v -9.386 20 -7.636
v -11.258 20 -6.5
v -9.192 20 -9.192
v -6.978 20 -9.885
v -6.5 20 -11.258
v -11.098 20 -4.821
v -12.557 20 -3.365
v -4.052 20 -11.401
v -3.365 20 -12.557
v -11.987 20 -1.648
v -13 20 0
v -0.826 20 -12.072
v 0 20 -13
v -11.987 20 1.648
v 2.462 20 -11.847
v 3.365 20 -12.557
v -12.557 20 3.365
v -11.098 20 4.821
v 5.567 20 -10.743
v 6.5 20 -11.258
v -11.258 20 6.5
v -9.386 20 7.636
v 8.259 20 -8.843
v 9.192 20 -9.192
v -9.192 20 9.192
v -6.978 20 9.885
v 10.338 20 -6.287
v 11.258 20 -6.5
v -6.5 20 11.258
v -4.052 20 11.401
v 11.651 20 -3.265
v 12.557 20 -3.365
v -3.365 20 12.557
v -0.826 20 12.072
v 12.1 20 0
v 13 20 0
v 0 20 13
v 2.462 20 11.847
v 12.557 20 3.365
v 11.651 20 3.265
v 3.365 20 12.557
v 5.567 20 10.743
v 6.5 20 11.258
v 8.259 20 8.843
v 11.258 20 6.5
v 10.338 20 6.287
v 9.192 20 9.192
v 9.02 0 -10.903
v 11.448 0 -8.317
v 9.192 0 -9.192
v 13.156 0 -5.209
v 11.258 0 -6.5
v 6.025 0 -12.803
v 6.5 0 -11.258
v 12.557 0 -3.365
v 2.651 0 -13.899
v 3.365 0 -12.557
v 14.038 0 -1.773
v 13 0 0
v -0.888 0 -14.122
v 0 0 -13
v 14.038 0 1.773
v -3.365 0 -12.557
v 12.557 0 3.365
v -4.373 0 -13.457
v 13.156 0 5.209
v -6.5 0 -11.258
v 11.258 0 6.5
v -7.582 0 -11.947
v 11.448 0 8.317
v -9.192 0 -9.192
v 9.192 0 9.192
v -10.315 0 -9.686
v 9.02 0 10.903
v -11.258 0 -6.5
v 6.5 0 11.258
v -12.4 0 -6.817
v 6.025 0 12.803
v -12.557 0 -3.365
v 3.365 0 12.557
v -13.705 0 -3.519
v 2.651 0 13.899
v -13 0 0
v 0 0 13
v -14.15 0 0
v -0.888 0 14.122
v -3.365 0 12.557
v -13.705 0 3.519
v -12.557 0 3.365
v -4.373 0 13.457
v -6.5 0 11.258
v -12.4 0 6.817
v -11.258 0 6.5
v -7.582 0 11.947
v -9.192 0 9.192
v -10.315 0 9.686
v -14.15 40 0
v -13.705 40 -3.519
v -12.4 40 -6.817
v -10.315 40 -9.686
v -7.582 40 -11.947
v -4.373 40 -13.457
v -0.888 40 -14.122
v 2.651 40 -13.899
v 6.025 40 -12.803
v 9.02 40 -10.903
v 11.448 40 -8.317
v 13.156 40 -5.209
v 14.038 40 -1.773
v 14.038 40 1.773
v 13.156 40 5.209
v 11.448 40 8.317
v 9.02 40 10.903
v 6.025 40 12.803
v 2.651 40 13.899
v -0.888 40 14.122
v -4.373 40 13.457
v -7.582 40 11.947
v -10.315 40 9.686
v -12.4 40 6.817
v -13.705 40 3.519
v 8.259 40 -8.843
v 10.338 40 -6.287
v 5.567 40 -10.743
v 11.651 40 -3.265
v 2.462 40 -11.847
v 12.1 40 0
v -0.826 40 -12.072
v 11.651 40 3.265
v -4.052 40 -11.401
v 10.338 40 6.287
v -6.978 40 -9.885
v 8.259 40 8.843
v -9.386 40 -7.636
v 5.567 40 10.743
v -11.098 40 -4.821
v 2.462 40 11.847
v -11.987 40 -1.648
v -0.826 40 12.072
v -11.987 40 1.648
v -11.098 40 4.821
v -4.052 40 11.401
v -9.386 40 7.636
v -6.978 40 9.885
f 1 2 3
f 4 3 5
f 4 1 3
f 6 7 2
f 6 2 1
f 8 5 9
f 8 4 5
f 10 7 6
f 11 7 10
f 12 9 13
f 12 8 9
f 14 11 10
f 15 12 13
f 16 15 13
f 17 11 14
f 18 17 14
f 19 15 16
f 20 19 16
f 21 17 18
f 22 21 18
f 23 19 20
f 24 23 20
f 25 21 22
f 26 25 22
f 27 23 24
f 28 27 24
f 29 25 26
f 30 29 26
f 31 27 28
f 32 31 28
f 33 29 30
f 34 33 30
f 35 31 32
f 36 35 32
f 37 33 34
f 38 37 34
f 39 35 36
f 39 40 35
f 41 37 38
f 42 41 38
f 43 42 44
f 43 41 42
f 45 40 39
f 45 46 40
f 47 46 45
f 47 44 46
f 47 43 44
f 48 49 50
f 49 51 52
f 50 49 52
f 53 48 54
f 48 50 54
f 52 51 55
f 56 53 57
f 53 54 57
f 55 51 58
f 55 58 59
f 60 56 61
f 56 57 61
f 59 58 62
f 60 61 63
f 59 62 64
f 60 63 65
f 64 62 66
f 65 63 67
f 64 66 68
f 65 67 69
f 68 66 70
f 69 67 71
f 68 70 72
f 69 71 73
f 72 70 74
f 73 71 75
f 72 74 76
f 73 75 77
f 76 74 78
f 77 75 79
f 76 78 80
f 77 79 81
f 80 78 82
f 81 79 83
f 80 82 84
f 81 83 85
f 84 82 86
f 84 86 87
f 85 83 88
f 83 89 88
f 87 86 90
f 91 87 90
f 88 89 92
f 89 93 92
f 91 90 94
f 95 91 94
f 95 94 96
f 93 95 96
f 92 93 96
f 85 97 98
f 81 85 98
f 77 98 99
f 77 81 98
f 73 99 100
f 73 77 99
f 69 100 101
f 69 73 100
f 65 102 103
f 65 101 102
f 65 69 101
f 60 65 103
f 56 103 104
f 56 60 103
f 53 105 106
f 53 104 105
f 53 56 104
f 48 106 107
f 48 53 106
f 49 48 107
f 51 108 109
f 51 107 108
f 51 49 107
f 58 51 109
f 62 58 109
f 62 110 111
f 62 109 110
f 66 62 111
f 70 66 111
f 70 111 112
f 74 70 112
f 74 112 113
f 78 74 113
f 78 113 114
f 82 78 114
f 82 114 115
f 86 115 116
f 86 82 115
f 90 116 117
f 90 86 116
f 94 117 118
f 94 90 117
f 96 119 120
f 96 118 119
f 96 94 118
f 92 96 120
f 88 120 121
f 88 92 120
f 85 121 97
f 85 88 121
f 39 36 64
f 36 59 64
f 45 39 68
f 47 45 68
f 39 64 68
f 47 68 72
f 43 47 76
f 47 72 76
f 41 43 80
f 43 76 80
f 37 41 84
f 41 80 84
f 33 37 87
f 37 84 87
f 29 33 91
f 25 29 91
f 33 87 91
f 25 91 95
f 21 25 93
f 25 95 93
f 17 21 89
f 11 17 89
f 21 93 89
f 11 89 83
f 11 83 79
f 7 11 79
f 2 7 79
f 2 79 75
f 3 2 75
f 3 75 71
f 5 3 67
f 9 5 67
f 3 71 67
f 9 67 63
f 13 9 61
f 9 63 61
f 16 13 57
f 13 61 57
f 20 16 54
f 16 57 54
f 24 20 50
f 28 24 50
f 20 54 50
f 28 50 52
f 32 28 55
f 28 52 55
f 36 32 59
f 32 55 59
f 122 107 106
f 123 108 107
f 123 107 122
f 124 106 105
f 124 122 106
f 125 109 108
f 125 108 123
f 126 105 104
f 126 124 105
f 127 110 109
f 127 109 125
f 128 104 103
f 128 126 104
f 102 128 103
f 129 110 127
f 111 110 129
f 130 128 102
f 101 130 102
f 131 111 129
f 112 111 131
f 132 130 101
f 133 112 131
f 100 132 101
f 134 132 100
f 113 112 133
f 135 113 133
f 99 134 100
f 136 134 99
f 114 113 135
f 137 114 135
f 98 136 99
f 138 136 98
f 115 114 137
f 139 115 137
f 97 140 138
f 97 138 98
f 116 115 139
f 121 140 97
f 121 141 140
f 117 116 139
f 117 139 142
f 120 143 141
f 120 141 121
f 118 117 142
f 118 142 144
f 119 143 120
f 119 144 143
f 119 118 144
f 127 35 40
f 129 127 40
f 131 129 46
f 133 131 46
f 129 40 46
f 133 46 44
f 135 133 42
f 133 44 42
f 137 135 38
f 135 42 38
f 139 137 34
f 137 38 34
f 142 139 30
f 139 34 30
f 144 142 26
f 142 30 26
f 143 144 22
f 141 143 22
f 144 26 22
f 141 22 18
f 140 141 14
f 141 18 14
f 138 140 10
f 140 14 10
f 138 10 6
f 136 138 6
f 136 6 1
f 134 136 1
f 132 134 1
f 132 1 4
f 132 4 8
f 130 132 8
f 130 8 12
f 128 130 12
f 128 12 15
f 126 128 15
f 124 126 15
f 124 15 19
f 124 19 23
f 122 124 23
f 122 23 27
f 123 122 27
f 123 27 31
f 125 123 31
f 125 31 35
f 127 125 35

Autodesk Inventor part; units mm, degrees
ref_plane "YZ Plane" through (0, 0, 0) normal (1, 0, 0) x (0, 1, 0)
ref_plane "XZ Plane" through (0, 0, 0) normal (0, 1, 0) x (-1, 0, 0)
ref_plane "XY Plane" through (0, 0, 0) normal (0, 0, 1) x (1, 0, 0)
sketch "Sketch1" plane through (0, 0, 0) normal (0, 1, 0) x (-1, 0, 0)
  circle A0 centre (0, 0) radius 14.15
  circle A1 centre (0, 0) radius 12.1
  dimension "d3" = 28.3
  dimension "d6" = 24.2
extrude "Extrusion1" add sketch "Sketch1" along normal blind 40 contours A0 | A1
sketch "Sketch3" plane through (0, 0, 0) normal (0, -1, 0) x (1, 0, 0)
  circle A0 centre (0, 0) radius 12.1
  dimension "d10" = 24.2
extrude "Extrusion3" cut sketch "Sketch3" against normal blind 40
sketch "Sketch4" plane through (0, 0, 0) normal (0, -1, 0) x (1, 0, 0)
  circle A0 centre (0, 0) radius 13
  dimension "d13" = 26
extrude "Extrusion4" cut sketch "Sketch4" against normal blind 20
properties part number "_3DPrint"
